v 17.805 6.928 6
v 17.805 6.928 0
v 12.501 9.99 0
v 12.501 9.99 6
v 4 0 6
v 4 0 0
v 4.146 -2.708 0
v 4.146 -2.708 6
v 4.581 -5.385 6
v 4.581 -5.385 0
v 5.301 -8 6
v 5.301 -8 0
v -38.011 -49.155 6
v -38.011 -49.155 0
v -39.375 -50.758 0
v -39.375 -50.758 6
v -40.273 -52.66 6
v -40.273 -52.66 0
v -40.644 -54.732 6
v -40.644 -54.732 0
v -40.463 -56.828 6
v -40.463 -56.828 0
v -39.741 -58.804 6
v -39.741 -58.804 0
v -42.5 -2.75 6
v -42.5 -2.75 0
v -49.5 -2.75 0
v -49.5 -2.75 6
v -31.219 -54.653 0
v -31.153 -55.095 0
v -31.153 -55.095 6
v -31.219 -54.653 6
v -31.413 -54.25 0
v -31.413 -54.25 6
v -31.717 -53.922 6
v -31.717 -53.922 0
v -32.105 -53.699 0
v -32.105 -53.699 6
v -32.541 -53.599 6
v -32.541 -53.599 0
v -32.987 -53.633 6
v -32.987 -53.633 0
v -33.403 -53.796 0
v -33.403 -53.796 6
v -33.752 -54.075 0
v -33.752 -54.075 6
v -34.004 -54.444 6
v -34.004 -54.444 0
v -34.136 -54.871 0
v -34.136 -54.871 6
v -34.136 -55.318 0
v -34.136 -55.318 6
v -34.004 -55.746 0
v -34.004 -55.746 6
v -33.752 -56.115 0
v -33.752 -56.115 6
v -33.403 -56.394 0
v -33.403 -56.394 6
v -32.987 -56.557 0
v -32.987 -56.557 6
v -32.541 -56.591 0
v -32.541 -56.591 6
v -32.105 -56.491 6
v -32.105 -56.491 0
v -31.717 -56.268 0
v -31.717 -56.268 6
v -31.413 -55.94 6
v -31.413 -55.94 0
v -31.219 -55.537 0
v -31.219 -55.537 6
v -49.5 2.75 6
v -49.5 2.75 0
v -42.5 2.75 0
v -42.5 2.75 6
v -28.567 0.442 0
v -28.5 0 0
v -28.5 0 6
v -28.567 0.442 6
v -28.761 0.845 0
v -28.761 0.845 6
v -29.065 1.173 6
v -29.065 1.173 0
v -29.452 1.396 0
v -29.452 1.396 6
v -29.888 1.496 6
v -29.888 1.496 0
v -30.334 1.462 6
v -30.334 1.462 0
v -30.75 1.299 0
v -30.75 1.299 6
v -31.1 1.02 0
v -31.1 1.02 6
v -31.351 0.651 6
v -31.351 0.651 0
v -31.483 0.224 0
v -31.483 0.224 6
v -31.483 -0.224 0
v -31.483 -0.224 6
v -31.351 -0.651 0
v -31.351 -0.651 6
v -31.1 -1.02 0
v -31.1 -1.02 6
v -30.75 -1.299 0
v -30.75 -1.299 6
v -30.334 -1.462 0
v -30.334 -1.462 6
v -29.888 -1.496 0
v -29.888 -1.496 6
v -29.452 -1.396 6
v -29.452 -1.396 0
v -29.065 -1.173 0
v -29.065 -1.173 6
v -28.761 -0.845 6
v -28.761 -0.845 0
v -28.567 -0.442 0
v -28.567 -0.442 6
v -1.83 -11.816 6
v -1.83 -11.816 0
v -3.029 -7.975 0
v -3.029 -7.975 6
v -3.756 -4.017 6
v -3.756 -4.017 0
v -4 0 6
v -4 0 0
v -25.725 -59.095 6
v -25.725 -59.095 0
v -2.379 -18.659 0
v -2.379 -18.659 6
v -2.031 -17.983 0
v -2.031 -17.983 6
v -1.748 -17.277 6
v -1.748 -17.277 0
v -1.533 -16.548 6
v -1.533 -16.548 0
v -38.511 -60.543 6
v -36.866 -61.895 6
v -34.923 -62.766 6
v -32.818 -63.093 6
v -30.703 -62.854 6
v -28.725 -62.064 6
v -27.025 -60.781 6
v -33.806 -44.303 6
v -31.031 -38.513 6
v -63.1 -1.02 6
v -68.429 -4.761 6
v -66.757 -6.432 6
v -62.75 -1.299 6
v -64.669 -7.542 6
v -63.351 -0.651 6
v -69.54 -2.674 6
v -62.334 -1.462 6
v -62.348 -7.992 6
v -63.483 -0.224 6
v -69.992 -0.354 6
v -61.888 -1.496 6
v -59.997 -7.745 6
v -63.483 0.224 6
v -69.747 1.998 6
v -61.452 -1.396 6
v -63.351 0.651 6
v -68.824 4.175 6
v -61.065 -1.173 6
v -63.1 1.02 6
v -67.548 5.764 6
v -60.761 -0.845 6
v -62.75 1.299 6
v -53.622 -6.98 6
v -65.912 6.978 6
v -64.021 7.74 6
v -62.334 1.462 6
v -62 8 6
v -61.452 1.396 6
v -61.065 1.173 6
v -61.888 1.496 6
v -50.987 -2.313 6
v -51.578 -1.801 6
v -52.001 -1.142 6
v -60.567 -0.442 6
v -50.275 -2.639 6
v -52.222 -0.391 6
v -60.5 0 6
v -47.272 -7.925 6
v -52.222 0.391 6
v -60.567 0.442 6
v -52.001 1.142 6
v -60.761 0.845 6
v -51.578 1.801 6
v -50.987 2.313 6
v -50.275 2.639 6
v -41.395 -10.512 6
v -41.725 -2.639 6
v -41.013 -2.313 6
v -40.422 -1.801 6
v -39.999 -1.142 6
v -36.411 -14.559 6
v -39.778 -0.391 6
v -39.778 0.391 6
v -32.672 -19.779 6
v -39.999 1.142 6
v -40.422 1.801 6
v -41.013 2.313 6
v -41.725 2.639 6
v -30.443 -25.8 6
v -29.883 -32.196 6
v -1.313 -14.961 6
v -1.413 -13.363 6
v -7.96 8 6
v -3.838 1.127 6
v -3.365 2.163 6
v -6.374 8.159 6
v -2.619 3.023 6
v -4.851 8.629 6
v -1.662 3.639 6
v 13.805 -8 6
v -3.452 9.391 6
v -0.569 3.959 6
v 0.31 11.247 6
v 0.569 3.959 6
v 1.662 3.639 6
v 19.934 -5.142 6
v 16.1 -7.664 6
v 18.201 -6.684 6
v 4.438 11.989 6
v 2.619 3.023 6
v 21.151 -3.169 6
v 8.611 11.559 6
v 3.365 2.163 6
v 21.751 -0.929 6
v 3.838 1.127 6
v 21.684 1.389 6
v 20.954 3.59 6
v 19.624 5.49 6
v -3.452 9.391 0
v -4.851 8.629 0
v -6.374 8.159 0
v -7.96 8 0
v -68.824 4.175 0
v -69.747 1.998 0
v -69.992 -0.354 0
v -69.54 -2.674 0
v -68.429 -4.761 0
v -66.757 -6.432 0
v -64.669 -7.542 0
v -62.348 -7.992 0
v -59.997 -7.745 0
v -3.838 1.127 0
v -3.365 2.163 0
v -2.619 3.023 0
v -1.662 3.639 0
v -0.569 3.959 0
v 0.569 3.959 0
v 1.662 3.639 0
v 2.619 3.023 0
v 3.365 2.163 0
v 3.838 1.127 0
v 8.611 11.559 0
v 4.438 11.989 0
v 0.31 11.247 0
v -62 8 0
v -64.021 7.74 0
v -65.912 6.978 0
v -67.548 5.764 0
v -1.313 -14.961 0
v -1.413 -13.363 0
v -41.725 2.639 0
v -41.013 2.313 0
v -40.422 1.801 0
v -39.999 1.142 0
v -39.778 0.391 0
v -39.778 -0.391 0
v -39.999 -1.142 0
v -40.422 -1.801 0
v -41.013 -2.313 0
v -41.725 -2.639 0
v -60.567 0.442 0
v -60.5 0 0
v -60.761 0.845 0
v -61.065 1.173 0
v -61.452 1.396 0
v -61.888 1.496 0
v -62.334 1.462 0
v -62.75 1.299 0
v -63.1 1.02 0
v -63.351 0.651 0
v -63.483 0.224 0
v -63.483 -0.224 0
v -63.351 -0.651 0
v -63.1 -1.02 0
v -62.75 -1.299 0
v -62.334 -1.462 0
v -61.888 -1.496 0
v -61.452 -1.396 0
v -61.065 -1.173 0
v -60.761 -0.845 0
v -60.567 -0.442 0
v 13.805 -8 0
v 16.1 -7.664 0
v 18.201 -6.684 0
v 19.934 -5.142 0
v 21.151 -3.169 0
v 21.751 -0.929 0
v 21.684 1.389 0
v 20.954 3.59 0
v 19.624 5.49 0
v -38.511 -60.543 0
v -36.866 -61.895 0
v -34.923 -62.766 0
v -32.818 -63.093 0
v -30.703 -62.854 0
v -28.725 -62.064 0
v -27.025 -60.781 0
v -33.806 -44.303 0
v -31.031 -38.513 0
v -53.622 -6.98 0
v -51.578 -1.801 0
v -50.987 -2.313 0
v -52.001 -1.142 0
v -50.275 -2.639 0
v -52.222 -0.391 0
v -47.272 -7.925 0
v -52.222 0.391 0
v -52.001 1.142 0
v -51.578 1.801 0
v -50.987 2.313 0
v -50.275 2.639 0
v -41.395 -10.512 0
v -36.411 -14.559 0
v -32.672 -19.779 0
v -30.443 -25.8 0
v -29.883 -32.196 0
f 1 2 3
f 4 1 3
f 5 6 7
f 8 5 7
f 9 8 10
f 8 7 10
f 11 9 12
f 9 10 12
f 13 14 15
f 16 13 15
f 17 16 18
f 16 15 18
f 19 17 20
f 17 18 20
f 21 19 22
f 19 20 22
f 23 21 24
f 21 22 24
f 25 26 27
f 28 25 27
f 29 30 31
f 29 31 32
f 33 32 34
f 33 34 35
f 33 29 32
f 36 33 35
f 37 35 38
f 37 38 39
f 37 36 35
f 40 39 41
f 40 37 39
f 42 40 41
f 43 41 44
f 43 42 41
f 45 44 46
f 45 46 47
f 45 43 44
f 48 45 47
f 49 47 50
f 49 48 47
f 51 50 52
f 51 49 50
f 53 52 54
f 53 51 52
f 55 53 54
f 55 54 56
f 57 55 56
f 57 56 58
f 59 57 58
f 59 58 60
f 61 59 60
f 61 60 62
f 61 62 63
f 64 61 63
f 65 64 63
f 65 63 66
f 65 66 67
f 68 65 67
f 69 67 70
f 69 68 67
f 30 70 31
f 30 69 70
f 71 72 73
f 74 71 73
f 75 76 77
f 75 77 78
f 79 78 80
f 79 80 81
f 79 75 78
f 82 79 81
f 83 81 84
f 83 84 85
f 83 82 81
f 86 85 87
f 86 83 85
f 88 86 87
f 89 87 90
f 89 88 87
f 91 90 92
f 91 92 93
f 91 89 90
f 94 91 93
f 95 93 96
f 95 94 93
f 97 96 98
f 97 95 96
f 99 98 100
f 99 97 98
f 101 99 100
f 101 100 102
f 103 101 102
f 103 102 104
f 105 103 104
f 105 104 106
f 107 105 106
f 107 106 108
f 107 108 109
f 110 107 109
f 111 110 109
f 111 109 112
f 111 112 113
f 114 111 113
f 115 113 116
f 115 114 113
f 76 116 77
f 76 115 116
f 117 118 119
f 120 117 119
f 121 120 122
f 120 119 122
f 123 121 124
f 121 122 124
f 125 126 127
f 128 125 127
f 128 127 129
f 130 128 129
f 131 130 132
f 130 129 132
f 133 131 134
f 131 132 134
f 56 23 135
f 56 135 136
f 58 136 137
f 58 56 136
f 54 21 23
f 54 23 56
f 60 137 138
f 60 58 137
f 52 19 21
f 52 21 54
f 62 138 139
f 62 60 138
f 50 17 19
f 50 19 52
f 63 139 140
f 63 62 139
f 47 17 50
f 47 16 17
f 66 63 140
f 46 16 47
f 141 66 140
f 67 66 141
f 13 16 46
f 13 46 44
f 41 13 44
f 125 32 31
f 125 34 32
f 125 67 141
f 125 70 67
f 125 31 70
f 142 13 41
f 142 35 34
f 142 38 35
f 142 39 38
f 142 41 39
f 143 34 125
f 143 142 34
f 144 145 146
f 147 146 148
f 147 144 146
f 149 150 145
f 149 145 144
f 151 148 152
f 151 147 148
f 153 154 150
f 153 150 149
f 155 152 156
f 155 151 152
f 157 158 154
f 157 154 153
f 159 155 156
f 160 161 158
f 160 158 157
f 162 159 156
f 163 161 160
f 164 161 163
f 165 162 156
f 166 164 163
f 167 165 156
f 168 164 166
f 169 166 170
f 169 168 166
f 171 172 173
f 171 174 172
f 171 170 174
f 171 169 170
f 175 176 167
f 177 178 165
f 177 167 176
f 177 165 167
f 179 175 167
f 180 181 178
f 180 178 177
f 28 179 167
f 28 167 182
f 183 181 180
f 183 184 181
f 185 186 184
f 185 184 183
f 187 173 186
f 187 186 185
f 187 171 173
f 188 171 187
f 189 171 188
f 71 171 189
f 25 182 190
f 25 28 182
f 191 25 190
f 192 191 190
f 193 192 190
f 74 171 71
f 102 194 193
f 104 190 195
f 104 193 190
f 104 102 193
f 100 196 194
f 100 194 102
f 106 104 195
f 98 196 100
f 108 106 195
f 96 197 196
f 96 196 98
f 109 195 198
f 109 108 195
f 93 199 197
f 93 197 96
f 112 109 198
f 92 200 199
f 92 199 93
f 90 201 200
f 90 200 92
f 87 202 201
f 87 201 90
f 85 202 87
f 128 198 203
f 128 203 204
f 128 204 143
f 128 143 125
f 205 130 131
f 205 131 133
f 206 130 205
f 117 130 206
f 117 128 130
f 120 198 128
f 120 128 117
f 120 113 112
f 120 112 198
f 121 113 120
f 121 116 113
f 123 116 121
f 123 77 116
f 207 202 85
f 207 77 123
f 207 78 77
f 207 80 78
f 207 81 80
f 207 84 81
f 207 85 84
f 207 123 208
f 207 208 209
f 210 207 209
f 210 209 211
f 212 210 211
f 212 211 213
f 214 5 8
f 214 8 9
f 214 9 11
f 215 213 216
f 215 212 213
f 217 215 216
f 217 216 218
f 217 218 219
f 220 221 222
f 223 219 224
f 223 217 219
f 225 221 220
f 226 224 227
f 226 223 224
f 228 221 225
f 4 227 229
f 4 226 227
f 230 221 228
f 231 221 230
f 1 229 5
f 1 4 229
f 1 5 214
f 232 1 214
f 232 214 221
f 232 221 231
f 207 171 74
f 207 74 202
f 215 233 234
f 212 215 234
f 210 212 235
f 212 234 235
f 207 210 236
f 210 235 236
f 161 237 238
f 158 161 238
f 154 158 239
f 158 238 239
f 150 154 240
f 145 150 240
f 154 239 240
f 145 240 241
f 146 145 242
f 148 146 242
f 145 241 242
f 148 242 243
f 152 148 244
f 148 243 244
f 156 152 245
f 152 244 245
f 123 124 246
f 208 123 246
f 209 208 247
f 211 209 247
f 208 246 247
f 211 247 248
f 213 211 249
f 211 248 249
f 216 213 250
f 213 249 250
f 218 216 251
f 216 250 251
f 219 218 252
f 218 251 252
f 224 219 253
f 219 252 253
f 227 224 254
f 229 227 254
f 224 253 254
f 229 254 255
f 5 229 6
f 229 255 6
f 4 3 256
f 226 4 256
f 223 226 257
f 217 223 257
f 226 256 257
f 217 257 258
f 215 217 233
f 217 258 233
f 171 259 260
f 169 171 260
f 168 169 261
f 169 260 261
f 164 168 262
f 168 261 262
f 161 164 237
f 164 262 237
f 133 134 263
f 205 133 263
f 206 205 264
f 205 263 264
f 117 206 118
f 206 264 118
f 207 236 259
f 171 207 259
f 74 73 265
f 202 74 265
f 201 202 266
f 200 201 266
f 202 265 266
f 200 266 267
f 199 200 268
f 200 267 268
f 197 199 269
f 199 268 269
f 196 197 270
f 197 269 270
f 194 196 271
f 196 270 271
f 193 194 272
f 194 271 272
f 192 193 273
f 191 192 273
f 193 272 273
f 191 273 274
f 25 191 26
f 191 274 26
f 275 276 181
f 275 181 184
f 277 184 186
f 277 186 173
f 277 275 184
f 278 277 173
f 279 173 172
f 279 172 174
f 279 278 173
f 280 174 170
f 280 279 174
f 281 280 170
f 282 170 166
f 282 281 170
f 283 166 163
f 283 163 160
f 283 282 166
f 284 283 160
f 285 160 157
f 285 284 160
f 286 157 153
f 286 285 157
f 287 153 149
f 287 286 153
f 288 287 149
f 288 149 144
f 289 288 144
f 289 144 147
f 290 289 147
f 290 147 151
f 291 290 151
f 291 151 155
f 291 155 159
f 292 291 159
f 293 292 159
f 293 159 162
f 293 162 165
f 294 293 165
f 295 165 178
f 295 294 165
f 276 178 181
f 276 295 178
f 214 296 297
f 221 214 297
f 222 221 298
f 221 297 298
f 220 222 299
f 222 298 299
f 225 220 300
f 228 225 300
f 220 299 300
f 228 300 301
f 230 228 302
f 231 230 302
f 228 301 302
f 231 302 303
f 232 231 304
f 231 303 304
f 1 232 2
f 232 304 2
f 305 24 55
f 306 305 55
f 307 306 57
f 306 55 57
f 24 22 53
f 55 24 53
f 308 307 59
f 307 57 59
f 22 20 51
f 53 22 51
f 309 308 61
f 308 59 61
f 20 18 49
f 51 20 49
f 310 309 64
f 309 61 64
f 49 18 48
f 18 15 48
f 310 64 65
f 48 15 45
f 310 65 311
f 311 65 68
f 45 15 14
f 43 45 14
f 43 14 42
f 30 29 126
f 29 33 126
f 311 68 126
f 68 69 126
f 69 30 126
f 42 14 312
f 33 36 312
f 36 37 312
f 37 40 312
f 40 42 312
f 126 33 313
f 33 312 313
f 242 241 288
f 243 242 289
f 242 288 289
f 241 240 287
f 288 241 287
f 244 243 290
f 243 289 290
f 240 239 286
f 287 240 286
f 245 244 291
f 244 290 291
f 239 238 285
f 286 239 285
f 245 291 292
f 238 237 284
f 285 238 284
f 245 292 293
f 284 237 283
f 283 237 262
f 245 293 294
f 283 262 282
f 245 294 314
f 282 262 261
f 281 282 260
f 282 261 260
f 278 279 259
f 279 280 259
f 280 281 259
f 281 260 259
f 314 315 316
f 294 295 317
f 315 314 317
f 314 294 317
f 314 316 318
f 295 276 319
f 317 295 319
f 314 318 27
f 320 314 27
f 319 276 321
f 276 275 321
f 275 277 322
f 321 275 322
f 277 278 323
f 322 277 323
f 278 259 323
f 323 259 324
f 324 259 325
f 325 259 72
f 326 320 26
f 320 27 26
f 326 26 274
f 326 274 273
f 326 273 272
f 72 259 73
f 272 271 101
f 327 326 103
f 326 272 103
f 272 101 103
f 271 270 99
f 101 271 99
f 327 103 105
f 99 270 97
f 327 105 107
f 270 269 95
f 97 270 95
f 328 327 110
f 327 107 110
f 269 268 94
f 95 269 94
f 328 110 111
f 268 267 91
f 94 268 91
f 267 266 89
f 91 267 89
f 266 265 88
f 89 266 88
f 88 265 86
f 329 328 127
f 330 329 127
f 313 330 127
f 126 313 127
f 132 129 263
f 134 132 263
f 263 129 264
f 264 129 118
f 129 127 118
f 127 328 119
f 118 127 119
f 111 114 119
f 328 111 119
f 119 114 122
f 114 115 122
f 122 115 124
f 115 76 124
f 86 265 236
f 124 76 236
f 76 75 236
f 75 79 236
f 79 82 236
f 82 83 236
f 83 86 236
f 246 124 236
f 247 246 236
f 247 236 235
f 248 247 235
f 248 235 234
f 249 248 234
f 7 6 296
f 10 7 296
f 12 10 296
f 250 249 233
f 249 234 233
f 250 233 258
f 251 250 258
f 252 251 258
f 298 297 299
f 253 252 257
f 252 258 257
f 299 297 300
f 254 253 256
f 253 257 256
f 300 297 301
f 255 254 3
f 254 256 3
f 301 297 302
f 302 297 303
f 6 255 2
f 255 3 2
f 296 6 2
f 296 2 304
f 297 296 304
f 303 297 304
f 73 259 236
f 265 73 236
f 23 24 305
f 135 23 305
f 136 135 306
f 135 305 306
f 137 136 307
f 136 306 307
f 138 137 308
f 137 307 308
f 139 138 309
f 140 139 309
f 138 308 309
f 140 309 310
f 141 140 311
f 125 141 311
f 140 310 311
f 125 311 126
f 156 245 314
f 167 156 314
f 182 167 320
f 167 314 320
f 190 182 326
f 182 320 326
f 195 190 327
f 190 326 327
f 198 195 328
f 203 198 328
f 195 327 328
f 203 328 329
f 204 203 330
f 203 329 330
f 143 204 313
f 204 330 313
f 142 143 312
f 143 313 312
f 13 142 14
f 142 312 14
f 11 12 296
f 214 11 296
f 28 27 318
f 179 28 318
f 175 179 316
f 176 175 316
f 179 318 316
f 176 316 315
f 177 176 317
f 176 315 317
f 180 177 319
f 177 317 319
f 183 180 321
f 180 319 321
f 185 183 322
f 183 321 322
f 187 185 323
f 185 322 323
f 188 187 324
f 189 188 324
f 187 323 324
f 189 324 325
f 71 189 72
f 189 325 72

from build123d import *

# Parameters (mm, degrees)
SKETCH1_R           = 1.5
BOSS_EXTRUDE1_DEPTH = 6


with BuildPart() as part:
    # Sketch1 → Boss-Extrude1 (new body)
    # profile 1 of 2: a face of its own
    with BuildSketch(Plane.XY):
        with BuildLine():
            ThreePointArc((4, 0), (4.32733046, -4.052535377), (5.300835088, -8))
            Line((5.300835088, -8), (13.805264562, -8))
            ThreePointArc((13.805264562, -8), (21.532676707, -2.070531706), (17.805227526, 6.928224613))
            Line((17.805227526, 6.928224613), (12.501235753, 9.990447886))
            ThreePointArc((12.501235753, 9.990447886), (4.438362285, 11.989459523), (-3.451860404, 9.391313647))
            ThreePointArc((-3.451860404, 9.391313647), (-9.98812759, -3.562916176), (-2.498625359, -15.990394414))
            Line((-2.498625359, -15.990394414), (-1.533326535, -16.54770307))
            ThreePointArc((-1.533326535, -16.54770307), (-1.322910636, -14.159598792), (-1.82950584, -11.816379171))
            ThreePointArc((-1.82950584, -11.816379171), (-3.45287502, -6.00703466), (-4, 0))
            ThreePointArc((-4, 0), (0, 4), (4, 0))
        make_face()
    # profile 2 of 2: a face of its own
    with BuildSketch(Plane.XY):
        with BuildLine():
            ThreePointArc((-2.498625359, -15.990394414), (-9.98812759, -3.562916176), (-3.451860404, 9.391313647))
            ThreePointArc((-3.451860404, 9.391313647), (-5.601136209, 8.355737746), (-7.960215392, 8))
            Line((-7.960215392, 8), (-62, 8))
            ThreePointArc((-62, 8), (-65.911631869, 6.978476633), (-68.824307899, 4.17478403))
            ThreePointArc((-68.824307899, 4.17478403), (-68.429059963, -4.761007035), (-59.997026703, -7.745198382))
            ThreePointArc((-59.997026703, -7.745198382), (-32.671781582, -19.77866562), (-38.011446212, -49.154869194))
            ThreePointArc((-38.011446212, -49.154869194), (-40.527279582, -53.683744804), (-39.740705478, -58.804431575))
            ThreePointArc((-39.740705478, -58.804431575), (-32.818486758, -63.093194538), (-25.724521947, -59.094912029))
            Line((-25.724521947, -59.094912029), (-2.379078452, -18.659417769))
            ThreePointArc((-2.379078452, -18.659417769), (-1.880761637, -17.633774846), (-1.533326535, -16.54770307))
            Line((-1.533326535, -16.54770307), (-2.498625359, -15.990394414))
        make_face()
        with Locations((-32.652725178, -55.094912029)):
            Circle(SKETCH1_R, mode=Mode.SUBTRACT)
        with Locations((-62, 0)):
            Circle(SKETCH1_R, mode=Mode.SUBTRACT)
        with BuildLine():
            ThreePointArc((-49.5, -2.75), (-52.25, 0), (-49.5, 2.75))
            Line((-49.5, 2.75), (-42.5, 2.75))
            ThreePointArc((-42.5, 2.75), (-39.75, 0), (-42.5, -2.75))
            Line((-42.5, -2.75), (-49.5, -2.75))
        make_face(mode=Mode.SUBTRACT)
        with Locations((-30, 0)):
            Circle(SKETCH1_R, mode=Mode.SUBTRACT)
    extrude(amount=BOSS_EXTRUDE1_DEPTH)


solid = part.part
